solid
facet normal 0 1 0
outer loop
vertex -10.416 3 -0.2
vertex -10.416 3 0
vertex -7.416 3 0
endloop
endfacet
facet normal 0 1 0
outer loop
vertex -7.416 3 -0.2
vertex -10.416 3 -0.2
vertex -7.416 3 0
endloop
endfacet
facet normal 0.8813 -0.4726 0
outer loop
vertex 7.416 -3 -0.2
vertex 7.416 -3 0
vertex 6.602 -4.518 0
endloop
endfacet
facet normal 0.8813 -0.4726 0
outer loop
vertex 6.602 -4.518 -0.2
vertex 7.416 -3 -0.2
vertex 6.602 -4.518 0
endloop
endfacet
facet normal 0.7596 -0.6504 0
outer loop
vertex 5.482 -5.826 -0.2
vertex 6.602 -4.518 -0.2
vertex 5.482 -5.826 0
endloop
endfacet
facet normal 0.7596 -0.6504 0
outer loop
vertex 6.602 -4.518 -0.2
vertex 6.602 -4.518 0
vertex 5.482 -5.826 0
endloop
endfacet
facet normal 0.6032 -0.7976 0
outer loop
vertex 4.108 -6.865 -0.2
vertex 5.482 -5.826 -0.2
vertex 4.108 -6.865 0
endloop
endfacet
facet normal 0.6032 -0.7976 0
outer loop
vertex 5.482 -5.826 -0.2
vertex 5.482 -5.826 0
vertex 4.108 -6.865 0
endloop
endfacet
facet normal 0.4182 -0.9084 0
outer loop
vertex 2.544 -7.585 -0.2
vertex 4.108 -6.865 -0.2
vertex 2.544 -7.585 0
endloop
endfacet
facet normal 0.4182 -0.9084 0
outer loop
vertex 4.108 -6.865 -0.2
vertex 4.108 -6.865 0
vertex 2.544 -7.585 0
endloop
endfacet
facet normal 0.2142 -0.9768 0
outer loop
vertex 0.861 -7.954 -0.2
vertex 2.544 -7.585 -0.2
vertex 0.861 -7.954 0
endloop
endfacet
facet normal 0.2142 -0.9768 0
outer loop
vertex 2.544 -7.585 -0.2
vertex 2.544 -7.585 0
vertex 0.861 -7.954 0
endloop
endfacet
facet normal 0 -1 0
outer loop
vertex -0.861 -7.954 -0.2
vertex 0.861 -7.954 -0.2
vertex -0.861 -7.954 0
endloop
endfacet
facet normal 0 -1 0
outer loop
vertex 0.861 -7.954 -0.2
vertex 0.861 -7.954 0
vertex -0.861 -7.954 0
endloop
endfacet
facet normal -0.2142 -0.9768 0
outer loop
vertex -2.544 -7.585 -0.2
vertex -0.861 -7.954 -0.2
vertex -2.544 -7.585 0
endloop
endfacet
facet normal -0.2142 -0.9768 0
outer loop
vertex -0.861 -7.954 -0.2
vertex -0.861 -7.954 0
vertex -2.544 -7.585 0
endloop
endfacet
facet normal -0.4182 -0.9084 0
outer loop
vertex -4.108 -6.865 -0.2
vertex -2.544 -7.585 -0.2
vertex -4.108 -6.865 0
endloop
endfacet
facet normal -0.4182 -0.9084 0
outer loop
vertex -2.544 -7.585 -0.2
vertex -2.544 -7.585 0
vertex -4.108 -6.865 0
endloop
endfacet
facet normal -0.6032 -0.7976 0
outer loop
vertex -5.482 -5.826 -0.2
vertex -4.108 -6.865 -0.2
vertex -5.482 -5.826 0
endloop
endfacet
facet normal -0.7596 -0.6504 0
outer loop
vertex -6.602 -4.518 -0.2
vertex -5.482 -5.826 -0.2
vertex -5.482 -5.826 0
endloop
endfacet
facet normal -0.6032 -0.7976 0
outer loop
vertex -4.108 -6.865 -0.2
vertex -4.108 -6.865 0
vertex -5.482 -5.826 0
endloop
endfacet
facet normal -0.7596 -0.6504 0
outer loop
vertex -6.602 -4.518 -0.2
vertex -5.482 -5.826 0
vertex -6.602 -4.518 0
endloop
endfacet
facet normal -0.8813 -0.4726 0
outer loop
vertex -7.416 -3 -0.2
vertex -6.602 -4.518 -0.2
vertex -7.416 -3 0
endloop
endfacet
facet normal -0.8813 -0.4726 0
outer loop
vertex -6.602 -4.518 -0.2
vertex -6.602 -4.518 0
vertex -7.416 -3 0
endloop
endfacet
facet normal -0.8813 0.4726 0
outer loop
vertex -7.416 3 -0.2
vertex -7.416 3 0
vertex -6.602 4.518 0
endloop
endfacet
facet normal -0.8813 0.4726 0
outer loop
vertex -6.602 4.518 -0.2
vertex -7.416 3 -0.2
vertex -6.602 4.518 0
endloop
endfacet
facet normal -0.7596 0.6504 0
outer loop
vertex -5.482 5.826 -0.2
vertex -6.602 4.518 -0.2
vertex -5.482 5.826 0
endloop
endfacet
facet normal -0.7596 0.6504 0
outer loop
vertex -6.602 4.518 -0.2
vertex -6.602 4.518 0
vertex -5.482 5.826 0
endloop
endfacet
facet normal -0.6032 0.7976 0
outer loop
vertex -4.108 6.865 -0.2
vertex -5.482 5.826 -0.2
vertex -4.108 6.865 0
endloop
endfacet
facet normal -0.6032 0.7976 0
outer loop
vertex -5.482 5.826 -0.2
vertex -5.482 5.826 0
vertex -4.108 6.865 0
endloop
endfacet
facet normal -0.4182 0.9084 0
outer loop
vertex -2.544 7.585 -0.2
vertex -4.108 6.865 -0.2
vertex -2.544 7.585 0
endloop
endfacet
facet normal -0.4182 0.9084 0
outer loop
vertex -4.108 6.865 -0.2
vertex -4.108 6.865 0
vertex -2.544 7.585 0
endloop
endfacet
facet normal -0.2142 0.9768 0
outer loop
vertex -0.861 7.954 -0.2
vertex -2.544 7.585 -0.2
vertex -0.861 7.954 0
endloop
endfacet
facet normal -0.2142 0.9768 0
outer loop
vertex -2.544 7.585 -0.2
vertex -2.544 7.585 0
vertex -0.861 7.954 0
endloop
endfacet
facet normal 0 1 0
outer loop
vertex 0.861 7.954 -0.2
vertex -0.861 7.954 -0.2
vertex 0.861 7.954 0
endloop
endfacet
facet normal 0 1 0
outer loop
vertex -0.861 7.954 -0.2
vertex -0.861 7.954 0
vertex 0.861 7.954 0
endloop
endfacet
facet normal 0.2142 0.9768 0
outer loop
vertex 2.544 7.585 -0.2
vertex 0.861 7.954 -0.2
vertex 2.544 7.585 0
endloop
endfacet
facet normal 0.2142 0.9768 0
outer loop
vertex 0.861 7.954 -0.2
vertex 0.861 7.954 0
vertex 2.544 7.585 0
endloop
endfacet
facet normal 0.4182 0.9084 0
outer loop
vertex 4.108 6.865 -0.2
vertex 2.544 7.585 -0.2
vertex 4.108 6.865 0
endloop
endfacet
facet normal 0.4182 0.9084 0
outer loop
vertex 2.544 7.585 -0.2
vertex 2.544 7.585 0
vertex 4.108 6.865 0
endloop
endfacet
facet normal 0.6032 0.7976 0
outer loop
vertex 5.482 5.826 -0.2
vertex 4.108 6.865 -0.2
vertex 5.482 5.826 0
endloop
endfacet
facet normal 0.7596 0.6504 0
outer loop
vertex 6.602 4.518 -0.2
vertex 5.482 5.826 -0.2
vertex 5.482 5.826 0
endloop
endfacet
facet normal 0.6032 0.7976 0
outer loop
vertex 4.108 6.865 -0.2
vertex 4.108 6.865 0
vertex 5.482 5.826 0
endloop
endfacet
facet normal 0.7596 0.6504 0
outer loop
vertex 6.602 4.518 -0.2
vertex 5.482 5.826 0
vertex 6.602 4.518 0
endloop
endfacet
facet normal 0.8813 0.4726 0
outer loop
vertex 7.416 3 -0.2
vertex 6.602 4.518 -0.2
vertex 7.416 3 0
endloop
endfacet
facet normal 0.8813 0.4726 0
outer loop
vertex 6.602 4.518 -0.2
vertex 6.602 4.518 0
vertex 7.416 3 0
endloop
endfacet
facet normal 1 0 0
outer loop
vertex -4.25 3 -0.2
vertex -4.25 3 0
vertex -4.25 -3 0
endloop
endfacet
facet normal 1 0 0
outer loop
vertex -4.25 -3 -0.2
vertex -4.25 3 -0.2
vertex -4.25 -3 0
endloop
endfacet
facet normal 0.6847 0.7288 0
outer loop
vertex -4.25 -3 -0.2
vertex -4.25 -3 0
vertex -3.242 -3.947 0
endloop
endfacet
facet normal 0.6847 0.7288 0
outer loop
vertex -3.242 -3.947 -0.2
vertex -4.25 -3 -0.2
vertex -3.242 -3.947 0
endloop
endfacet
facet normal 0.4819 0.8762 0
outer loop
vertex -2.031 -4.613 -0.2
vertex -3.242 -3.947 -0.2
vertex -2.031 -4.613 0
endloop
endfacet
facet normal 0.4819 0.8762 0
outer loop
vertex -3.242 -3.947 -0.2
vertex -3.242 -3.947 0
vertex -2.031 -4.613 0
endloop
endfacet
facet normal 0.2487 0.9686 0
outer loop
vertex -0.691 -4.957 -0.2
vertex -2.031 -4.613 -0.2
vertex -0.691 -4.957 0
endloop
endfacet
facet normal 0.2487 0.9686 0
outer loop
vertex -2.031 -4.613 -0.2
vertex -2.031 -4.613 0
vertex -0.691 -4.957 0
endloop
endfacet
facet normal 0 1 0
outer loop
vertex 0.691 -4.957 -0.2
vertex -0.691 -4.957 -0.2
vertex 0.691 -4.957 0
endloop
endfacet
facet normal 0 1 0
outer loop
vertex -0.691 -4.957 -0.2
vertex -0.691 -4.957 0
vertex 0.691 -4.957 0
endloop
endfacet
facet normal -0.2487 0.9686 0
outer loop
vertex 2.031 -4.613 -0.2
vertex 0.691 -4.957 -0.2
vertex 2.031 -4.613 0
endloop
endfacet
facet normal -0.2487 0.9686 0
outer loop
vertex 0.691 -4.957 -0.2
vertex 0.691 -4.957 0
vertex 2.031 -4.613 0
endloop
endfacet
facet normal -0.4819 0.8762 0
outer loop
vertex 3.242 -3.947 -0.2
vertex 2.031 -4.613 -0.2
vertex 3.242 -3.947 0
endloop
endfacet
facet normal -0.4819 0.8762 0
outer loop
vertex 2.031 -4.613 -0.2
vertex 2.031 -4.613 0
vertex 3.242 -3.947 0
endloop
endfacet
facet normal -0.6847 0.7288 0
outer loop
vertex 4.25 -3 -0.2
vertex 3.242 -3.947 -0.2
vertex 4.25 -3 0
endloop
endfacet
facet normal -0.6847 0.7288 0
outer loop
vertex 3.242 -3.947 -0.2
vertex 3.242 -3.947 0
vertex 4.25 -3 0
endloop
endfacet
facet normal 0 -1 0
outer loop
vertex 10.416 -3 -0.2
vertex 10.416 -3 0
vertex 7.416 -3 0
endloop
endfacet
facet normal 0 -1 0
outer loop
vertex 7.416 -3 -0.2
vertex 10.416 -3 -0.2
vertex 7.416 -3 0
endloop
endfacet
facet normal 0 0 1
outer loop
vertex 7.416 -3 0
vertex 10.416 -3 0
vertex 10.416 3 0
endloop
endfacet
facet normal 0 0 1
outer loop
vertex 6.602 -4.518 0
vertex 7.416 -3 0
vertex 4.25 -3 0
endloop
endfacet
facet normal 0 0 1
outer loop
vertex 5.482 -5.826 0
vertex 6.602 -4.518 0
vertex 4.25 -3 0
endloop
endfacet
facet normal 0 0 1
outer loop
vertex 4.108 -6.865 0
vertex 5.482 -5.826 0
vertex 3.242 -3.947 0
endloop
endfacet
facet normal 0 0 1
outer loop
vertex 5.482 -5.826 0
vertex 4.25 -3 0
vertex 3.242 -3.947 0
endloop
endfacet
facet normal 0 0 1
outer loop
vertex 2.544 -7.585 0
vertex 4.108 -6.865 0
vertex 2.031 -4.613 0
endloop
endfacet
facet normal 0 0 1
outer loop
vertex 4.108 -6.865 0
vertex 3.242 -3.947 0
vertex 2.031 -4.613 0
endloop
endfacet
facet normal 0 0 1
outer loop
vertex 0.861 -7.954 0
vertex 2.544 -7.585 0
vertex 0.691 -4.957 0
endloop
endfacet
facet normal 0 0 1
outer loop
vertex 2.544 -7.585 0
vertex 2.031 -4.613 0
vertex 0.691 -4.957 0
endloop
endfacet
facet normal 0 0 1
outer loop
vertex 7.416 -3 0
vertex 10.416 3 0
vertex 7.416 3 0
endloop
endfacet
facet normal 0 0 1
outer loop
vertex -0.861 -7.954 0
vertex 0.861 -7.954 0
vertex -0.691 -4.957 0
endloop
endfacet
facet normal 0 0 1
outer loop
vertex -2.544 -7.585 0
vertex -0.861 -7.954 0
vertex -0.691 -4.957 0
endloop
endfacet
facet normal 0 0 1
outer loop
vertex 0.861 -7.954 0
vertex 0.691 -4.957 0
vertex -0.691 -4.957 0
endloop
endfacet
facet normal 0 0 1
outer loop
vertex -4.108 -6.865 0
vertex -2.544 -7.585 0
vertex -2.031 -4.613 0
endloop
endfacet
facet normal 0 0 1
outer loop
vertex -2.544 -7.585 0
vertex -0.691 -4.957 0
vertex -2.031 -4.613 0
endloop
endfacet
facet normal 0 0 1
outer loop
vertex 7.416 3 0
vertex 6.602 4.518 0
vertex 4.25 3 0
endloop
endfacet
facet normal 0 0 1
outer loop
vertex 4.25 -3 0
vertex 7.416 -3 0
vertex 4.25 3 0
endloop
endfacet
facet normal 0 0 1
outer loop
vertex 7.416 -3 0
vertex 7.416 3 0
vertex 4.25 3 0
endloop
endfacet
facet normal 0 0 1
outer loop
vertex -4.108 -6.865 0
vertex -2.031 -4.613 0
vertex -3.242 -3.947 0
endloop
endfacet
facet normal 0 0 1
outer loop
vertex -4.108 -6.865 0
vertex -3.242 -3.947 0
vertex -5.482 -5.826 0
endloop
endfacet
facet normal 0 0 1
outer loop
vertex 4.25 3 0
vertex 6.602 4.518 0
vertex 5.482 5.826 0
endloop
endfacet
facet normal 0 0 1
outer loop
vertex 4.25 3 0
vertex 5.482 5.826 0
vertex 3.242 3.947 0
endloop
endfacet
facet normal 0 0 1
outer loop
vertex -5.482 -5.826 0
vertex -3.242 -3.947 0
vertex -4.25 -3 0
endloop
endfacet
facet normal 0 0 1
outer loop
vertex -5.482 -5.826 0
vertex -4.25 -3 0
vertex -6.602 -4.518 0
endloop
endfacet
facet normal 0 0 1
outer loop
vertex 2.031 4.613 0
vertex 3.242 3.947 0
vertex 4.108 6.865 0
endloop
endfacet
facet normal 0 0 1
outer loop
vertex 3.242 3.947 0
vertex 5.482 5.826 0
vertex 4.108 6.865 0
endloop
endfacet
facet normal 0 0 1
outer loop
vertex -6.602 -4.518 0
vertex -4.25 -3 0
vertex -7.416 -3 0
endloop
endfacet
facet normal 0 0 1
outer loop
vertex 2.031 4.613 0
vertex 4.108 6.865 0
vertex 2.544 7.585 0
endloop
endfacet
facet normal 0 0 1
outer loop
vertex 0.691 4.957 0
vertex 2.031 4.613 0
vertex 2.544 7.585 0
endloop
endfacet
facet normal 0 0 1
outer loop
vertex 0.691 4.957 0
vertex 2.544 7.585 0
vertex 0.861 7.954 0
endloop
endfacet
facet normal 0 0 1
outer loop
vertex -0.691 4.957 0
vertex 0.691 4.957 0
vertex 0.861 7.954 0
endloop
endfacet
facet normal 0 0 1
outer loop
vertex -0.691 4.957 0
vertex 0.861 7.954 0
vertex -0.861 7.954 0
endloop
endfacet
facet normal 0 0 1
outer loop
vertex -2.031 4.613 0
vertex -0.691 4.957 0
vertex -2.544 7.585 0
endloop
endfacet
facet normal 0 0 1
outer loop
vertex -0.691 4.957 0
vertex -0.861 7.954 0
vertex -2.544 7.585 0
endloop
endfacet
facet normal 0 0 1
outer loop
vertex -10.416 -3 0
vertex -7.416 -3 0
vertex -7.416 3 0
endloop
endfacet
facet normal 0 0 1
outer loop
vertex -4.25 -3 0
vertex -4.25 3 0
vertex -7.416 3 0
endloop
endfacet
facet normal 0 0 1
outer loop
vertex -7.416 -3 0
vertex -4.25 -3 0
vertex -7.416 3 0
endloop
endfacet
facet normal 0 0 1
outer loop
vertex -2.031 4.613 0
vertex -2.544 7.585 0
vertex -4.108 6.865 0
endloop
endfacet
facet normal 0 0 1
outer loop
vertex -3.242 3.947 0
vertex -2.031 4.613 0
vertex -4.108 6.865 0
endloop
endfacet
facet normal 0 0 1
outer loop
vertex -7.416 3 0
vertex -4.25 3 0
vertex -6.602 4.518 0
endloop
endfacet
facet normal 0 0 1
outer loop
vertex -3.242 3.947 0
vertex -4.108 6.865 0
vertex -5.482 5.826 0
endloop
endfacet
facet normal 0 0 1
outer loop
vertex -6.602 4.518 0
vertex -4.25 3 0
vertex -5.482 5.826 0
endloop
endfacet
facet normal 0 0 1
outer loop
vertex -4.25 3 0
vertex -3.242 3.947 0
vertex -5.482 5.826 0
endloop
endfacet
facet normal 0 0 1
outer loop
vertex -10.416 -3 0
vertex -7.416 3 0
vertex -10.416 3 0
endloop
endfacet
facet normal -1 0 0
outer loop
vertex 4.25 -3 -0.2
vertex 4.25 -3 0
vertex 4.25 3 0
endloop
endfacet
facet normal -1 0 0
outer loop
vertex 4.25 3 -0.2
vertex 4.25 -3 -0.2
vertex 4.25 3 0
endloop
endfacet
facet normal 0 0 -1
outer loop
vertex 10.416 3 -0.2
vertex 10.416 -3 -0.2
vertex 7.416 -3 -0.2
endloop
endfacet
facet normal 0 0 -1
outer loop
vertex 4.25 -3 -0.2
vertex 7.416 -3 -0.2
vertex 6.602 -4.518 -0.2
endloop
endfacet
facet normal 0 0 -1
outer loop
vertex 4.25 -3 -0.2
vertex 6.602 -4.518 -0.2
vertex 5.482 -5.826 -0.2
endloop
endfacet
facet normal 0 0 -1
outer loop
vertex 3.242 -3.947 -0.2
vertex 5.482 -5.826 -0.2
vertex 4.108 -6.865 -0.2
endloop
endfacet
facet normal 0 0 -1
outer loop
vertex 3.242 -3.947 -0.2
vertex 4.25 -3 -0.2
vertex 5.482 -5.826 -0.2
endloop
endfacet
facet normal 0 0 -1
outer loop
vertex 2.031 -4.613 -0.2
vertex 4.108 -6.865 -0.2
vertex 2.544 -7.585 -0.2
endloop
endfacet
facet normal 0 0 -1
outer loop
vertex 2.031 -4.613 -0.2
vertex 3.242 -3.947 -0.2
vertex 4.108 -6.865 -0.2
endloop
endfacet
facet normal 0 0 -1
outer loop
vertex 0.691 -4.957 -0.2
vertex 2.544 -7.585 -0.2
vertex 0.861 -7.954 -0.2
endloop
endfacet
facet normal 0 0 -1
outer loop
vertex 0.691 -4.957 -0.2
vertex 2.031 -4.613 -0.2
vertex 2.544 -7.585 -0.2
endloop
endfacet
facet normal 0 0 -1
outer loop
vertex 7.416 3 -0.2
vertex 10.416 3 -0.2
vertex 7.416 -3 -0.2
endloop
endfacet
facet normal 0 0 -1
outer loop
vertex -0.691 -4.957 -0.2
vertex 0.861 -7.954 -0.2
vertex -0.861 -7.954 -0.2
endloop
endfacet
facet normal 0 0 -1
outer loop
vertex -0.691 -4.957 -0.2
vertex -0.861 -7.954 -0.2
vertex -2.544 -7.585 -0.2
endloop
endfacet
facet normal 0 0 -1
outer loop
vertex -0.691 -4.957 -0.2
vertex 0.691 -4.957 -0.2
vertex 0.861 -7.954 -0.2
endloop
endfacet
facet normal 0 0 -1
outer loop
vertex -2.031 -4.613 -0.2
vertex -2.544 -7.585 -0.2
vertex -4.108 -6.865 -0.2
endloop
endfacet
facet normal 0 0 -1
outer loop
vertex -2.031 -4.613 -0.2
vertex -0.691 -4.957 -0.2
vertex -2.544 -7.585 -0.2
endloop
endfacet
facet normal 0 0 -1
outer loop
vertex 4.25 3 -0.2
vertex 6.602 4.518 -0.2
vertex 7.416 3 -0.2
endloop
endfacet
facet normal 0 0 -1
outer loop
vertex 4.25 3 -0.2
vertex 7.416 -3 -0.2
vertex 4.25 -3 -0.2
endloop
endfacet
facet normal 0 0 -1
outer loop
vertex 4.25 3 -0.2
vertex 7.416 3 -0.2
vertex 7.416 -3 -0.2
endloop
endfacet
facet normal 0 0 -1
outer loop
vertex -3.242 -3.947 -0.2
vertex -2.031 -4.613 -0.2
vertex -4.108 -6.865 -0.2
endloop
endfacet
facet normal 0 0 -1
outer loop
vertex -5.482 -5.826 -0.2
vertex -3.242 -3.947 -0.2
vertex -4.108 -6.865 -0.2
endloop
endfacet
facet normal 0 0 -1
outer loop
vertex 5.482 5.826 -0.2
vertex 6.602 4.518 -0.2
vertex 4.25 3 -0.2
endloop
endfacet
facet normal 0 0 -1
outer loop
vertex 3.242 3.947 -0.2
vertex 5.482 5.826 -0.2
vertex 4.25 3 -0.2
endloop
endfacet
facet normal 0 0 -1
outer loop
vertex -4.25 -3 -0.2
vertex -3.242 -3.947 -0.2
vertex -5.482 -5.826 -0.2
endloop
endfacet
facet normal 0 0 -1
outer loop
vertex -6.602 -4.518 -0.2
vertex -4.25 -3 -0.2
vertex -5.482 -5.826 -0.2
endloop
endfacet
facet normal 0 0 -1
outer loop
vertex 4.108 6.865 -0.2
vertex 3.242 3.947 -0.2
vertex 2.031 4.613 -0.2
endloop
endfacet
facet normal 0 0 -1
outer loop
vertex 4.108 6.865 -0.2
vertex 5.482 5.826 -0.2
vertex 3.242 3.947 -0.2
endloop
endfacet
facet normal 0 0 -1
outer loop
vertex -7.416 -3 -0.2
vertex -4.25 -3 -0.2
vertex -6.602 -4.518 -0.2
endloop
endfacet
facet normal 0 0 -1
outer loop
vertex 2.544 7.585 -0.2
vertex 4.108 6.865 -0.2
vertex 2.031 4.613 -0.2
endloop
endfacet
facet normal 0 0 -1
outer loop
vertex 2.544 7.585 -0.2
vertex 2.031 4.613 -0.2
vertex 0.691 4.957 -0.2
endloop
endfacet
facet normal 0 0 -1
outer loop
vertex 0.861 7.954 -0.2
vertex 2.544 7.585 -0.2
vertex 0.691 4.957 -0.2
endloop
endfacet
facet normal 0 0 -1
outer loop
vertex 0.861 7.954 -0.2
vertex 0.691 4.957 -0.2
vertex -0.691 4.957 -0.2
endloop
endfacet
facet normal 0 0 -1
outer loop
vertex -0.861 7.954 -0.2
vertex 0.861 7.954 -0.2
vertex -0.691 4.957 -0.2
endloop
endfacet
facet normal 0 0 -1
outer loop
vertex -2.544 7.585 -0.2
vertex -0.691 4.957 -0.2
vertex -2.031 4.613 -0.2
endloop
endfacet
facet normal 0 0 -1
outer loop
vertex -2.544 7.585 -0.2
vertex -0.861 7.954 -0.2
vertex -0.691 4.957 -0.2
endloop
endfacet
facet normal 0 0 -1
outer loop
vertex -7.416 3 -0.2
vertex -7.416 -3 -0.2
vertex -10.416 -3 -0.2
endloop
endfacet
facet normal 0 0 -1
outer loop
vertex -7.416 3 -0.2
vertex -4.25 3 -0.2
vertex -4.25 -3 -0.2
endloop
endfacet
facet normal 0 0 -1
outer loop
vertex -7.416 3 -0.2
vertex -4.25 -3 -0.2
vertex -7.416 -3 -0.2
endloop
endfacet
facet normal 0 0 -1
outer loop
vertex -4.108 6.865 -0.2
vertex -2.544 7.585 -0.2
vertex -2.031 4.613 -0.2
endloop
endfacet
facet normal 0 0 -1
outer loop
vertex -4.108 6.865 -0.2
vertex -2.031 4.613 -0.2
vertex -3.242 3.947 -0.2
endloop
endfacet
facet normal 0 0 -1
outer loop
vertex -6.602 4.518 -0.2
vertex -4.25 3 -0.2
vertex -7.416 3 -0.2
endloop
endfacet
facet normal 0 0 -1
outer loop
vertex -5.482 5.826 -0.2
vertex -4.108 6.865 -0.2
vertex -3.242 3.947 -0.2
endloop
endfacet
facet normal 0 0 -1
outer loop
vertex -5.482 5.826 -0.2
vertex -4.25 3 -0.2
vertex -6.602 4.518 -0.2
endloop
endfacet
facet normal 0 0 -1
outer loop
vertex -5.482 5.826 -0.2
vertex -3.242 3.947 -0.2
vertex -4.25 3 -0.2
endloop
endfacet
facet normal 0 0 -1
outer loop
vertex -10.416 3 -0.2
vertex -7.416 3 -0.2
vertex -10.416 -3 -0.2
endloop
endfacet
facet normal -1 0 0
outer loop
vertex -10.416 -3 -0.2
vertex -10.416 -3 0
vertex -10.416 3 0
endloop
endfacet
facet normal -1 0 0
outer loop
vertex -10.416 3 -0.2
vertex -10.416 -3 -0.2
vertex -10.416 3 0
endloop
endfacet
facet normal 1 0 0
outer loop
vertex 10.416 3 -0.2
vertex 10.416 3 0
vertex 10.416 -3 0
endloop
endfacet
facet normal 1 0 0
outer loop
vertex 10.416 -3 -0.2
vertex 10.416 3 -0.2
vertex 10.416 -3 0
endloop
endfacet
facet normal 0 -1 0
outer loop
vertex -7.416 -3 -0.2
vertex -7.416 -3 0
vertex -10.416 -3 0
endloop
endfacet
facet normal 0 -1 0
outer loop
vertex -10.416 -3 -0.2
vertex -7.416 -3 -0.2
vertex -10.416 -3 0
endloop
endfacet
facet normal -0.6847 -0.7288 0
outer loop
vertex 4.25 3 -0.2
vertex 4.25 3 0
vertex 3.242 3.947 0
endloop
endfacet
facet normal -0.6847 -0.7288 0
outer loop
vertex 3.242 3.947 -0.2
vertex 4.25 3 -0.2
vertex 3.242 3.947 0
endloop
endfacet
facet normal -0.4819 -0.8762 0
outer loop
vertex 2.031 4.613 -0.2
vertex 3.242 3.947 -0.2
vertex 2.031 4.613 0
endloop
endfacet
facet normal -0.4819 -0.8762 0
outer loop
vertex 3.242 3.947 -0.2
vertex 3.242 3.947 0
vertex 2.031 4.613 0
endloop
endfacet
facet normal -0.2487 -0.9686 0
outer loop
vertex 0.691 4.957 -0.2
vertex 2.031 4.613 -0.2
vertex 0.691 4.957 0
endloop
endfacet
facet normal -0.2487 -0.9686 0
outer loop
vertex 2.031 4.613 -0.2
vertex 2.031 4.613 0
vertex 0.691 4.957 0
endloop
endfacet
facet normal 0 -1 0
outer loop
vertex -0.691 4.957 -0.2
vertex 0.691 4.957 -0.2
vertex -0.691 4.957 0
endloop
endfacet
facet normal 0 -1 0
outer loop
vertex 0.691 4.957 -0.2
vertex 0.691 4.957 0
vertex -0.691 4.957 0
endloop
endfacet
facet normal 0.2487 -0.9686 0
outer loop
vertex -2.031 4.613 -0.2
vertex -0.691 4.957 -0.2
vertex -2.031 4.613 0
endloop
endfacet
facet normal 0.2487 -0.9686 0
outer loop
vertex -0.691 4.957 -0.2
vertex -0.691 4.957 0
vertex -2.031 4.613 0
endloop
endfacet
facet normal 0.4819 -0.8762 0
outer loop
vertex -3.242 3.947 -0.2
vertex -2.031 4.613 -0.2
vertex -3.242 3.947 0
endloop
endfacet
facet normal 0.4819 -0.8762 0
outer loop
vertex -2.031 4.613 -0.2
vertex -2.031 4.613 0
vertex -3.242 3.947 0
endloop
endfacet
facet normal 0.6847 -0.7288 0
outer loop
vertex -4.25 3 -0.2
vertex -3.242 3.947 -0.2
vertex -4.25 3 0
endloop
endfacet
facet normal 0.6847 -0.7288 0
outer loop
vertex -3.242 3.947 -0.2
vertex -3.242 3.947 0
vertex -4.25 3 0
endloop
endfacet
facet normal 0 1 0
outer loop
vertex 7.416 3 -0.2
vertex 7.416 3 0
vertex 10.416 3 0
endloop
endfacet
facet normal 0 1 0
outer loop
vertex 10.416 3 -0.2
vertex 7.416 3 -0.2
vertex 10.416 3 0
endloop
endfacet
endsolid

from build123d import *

# Parameters (mm, degrees)
BASE_FLANGE1_DEPTH = 0.2


# Sheet-metal steps are written as plain solids
with BuildPart() as part:
    # Sketch1 → Base-Flange1 (new body)
    with BuildSketch(Plane.XY):
        with BuildLine():
            Line((7.416198487, 3), (10.416198487, 3))
            Line((10.416198487, 3), (10.416198487, -3))
            Line((10.416198487, -3), (7.416198487, -3))
            ThreePointArc((7.416198487, -3), (0, -8), (-7.416198487, -3))
            Line((-7.416198487, -3), (-10.416198487, -3))
            Line((-10.416198487, -3), (-10.416198487, 3))
            Line((-10.416198487, 3), (-7.416198487, 3))
            ThreePointArc((-7.416198487, 3), (0, 8), (7.416198487, 3))
        make_face()
        with BuildLine():
            Line((-4.25, 3), (-4.25, -3))
            ThreePointArc((-4.25, -3), (0, -5), (4.25, -3))
            Line((4.25, -3), (4.25, 3))
            ThreePointArc((4.25, 3), (0, 5), (-4.25, 3))
        make_face(mode=Mode.SUBTRACT)
    extrude(amount=-BASE_FLANGE1_DEPTH)


solid = part.part
